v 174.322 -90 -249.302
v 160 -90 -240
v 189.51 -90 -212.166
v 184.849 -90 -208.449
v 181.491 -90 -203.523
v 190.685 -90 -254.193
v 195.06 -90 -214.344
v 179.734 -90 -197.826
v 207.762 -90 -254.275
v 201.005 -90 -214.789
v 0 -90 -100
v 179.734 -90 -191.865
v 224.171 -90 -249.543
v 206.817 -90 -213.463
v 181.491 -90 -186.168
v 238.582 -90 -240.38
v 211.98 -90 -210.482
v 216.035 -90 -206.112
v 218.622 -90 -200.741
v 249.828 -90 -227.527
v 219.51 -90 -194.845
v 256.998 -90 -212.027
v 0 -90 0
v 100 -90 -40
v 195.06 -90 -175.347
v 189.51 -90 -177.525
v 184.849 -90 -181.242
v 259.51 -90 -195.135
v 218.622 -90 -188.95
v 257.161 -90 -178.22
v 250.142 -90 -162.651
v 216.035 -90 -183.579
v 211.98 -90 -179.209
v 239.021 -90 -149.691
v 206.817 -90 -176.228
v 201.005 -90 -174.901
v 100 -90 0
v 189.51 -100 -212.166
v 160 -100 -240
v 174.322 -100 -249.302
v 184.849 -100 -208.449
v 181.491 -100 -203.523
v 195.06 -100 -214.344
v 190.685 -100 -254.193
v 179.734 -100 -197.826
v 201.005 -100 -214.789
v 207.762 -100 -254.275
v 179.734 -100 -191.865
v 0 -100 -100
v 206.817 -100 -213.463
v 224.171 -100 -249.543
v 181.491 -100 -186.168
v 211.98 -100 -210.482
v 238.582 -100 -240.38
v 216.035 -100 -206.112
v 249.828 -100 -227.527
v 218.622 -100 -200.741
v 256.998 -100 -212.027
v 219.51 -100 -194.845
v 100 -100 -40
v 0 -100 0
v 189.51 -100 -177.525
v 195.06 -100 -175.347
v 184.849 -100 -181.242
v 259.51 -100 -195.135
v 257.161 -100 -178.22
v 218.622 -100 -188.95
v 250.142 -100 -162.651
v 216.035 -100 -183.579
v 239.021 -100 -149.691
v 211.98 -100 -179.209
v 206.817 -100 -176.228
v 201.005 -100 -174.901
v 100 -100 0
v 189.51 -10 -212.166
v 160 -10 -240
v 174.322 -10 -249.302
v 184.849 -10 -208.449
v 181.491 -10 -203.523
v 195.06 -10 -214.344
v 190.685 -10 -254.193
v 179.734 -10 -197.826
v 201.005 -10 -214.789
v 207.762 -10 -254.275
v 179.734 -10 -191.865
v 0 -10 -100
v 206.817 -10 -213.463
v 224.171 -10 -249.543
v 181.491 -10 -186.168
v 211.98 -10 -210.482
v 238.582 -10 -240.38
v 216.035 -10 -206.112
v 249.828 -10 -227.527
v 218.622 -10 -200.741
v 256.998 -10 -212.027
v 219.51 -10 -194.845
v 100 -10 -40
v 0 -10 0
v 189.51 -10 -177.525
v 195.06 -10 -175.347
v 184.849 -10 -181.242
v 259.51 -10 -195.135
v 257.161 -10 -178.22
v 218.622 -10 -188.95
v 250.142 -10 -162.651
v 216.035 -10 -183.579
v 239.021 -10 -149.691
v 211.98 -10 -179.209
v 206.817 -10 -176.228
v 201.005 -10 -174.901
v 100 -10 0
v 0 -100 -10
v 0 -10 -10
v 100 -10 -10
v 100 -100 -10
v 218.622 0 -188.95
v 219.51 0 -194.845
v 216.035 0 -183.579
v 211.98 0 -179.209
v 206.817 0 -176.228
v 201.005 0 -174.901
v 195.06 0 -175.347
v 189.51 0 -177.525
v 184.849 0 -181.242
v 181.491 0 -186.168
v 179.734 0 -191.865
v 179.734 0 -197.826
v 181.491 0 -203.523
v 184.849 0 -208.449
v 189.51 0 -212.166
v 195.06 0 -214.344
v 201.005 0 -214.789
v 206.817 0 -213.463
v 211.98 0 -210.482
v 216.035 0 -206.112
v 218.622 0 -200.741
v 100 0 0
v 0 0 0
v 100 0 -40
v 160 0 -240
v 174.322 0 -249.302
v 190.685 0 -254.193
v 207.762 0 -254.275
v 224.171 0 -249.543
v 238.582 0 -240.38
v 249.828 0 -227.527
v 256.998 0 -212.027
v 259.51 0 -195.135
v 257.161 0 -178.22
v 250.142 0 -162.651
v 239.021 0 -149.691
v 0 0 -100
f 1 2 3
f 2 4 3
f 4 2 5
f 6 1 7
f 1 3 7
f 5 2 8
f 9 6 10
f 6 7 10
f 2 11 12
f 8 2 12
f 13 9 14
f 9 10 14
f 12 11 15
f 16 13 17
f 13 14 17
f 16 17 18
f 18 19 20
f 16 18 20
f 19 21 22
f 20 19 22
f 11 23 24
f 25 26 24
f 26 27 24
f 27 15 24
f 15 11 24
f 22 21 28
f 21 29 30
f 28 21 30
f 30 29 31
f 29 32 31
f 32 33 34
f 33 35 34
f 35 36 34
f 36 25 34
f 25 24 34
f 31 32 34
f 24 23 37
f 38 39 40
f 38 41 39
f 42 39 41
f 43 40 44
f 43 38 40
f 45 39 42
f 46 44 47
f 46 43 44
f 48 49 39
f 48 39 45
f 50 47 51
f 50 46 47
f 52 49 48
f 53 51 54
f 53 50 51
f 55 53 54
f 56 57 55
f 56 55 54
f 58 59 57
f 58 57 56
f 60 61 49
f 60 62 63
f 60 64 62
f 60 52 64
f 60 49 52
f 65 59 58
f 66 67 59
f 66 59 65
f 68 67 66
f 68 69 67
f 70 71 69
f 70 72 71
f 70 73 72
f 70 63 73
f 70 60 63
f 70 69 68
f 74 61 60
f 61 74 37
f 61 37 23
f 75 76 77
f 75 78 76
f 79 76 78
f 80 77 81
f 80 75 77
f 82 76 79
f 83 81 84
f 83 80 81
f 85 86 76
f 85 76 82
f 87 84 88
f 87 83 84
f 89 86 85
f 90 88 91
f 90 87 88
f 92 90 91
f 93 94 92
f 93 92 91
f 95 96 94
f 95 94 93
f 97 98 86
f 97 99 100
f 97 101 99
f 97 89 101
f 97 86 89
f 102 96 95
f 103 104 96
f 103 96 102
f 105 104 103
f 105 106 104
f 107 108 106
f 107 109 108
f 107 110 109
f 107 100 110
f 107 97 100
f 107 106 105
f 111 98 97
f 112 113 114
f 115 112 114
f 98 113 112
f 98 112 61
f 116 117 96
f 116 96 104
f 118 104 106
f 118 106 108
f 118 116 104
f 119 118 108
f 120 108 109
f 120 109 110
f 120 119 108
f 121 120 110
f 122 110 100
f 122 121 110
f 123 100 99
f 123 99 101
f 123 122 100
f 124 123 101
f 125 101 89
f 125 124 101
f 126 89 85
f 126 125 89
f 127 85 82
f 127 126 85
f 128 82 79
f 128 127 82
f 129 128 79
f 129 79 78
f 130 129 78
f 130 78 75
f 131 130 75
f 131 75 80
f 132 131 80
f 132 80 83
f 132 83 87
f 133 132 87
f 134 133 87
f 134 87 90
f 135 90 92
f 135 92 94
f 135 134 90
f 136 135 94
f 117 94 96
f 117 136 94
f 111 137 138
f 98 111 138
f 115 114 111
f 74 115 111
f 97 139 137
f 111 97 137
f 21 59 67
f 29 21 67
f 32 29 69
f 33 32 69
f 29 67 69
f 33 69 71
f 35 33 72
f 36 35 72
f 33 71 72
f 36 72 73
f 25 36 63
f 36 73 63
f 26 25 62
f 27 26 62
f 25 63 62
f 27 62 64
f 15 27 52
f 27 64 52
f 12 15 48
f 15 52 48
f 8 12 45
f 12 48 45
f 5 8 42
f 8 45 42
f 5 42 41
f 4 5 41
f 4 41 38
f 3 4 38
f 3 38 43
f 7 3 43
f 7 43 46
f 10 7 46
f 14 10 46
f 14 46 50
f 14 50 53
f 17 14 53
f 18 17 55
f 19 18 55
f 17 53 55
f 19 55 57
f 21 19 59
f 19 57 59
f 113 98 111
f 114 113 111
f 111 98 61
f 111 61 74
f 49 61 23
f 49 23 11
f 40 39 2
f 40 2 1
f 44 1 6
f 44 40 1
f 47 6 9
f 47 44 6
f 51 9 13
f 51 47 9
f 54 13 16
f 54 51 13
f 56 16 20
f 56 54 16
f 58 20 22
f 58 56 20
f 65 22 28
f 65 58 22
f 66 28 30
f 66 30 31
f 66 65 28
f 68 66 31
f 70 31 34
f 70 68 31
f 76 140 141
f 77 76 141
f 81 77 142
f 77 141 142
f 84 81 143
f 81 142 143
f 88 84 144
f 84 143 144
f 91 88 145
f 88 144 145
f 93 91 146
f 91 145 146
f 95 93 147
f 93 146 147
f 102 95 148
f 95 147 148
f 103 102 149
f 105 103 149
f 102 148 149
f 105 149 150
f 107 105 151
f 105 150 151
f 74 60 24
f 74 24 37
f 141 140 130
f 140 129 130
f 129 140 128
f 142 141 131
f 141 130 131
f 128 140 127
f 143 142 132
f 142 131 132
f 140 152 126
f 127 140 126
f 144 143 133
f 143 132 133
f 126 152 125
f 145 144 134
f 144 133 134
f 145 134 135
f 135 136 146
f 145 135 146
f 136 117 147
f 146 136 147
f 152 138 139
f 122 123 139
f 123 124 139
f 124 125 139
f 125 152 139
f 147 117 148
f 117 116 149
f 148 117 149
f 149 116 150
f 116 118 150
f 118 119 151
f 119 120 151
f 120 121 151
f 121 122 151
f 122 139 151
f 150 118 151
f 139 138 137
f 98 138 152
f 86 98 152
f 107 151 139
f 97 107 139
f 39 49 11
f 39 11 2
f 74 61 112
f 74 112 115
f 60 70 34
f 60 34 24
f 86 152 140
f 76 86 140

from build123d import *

# Parameters (mm, degrees)
F0_R     = 20
F1_DEPTH = 10
F4_W     = 100
F4_H     = 10
F5_DEPTH = 90


with BuildPart() as f1:
    # F0 (on Front) → F1 (new body)
    with BuildSketch(Plane.XZ):
        with BuildLine():
            Line((50, 0), (0, 0))
            Line((0, 0), (0, -100))
            Line((0, -100), (160, -240))
            ThreePointArc((160, -240), (244.664878, -234.355675), (239.020553, -149.690797))
            Line((239.020553, -149.690797), (100, -40))
            Line((100, -40), (100, 0))
            Line((100, 0), (50, 0))
        make_face()
        with Locations((199.510276, -194.845398)):
            Circle(F0_R, mode=Mode.SUBTRACT)
    extrude(amount=F1_DEPTH)


with BuildPart() as f3_1:
    # F3: instance of F1
    add(f1.part.mirror(Plane(origin=(120.487236, -50, -125.003988), x_dir=(1, 0, 0), z_dir=(0, -1, 0))))


with BuildPart() as f5:
    # F4 (on face) → F5 (new body)
    with BuildSketch(Plane.XZ.offset(10)):
        with Locations((50, -5)):
            Rectangle(F4_W, F4_H)
    extrude(amount=F5_DEPTH)


solid = Compound([f1.part, f3_1.part, f5.part])
